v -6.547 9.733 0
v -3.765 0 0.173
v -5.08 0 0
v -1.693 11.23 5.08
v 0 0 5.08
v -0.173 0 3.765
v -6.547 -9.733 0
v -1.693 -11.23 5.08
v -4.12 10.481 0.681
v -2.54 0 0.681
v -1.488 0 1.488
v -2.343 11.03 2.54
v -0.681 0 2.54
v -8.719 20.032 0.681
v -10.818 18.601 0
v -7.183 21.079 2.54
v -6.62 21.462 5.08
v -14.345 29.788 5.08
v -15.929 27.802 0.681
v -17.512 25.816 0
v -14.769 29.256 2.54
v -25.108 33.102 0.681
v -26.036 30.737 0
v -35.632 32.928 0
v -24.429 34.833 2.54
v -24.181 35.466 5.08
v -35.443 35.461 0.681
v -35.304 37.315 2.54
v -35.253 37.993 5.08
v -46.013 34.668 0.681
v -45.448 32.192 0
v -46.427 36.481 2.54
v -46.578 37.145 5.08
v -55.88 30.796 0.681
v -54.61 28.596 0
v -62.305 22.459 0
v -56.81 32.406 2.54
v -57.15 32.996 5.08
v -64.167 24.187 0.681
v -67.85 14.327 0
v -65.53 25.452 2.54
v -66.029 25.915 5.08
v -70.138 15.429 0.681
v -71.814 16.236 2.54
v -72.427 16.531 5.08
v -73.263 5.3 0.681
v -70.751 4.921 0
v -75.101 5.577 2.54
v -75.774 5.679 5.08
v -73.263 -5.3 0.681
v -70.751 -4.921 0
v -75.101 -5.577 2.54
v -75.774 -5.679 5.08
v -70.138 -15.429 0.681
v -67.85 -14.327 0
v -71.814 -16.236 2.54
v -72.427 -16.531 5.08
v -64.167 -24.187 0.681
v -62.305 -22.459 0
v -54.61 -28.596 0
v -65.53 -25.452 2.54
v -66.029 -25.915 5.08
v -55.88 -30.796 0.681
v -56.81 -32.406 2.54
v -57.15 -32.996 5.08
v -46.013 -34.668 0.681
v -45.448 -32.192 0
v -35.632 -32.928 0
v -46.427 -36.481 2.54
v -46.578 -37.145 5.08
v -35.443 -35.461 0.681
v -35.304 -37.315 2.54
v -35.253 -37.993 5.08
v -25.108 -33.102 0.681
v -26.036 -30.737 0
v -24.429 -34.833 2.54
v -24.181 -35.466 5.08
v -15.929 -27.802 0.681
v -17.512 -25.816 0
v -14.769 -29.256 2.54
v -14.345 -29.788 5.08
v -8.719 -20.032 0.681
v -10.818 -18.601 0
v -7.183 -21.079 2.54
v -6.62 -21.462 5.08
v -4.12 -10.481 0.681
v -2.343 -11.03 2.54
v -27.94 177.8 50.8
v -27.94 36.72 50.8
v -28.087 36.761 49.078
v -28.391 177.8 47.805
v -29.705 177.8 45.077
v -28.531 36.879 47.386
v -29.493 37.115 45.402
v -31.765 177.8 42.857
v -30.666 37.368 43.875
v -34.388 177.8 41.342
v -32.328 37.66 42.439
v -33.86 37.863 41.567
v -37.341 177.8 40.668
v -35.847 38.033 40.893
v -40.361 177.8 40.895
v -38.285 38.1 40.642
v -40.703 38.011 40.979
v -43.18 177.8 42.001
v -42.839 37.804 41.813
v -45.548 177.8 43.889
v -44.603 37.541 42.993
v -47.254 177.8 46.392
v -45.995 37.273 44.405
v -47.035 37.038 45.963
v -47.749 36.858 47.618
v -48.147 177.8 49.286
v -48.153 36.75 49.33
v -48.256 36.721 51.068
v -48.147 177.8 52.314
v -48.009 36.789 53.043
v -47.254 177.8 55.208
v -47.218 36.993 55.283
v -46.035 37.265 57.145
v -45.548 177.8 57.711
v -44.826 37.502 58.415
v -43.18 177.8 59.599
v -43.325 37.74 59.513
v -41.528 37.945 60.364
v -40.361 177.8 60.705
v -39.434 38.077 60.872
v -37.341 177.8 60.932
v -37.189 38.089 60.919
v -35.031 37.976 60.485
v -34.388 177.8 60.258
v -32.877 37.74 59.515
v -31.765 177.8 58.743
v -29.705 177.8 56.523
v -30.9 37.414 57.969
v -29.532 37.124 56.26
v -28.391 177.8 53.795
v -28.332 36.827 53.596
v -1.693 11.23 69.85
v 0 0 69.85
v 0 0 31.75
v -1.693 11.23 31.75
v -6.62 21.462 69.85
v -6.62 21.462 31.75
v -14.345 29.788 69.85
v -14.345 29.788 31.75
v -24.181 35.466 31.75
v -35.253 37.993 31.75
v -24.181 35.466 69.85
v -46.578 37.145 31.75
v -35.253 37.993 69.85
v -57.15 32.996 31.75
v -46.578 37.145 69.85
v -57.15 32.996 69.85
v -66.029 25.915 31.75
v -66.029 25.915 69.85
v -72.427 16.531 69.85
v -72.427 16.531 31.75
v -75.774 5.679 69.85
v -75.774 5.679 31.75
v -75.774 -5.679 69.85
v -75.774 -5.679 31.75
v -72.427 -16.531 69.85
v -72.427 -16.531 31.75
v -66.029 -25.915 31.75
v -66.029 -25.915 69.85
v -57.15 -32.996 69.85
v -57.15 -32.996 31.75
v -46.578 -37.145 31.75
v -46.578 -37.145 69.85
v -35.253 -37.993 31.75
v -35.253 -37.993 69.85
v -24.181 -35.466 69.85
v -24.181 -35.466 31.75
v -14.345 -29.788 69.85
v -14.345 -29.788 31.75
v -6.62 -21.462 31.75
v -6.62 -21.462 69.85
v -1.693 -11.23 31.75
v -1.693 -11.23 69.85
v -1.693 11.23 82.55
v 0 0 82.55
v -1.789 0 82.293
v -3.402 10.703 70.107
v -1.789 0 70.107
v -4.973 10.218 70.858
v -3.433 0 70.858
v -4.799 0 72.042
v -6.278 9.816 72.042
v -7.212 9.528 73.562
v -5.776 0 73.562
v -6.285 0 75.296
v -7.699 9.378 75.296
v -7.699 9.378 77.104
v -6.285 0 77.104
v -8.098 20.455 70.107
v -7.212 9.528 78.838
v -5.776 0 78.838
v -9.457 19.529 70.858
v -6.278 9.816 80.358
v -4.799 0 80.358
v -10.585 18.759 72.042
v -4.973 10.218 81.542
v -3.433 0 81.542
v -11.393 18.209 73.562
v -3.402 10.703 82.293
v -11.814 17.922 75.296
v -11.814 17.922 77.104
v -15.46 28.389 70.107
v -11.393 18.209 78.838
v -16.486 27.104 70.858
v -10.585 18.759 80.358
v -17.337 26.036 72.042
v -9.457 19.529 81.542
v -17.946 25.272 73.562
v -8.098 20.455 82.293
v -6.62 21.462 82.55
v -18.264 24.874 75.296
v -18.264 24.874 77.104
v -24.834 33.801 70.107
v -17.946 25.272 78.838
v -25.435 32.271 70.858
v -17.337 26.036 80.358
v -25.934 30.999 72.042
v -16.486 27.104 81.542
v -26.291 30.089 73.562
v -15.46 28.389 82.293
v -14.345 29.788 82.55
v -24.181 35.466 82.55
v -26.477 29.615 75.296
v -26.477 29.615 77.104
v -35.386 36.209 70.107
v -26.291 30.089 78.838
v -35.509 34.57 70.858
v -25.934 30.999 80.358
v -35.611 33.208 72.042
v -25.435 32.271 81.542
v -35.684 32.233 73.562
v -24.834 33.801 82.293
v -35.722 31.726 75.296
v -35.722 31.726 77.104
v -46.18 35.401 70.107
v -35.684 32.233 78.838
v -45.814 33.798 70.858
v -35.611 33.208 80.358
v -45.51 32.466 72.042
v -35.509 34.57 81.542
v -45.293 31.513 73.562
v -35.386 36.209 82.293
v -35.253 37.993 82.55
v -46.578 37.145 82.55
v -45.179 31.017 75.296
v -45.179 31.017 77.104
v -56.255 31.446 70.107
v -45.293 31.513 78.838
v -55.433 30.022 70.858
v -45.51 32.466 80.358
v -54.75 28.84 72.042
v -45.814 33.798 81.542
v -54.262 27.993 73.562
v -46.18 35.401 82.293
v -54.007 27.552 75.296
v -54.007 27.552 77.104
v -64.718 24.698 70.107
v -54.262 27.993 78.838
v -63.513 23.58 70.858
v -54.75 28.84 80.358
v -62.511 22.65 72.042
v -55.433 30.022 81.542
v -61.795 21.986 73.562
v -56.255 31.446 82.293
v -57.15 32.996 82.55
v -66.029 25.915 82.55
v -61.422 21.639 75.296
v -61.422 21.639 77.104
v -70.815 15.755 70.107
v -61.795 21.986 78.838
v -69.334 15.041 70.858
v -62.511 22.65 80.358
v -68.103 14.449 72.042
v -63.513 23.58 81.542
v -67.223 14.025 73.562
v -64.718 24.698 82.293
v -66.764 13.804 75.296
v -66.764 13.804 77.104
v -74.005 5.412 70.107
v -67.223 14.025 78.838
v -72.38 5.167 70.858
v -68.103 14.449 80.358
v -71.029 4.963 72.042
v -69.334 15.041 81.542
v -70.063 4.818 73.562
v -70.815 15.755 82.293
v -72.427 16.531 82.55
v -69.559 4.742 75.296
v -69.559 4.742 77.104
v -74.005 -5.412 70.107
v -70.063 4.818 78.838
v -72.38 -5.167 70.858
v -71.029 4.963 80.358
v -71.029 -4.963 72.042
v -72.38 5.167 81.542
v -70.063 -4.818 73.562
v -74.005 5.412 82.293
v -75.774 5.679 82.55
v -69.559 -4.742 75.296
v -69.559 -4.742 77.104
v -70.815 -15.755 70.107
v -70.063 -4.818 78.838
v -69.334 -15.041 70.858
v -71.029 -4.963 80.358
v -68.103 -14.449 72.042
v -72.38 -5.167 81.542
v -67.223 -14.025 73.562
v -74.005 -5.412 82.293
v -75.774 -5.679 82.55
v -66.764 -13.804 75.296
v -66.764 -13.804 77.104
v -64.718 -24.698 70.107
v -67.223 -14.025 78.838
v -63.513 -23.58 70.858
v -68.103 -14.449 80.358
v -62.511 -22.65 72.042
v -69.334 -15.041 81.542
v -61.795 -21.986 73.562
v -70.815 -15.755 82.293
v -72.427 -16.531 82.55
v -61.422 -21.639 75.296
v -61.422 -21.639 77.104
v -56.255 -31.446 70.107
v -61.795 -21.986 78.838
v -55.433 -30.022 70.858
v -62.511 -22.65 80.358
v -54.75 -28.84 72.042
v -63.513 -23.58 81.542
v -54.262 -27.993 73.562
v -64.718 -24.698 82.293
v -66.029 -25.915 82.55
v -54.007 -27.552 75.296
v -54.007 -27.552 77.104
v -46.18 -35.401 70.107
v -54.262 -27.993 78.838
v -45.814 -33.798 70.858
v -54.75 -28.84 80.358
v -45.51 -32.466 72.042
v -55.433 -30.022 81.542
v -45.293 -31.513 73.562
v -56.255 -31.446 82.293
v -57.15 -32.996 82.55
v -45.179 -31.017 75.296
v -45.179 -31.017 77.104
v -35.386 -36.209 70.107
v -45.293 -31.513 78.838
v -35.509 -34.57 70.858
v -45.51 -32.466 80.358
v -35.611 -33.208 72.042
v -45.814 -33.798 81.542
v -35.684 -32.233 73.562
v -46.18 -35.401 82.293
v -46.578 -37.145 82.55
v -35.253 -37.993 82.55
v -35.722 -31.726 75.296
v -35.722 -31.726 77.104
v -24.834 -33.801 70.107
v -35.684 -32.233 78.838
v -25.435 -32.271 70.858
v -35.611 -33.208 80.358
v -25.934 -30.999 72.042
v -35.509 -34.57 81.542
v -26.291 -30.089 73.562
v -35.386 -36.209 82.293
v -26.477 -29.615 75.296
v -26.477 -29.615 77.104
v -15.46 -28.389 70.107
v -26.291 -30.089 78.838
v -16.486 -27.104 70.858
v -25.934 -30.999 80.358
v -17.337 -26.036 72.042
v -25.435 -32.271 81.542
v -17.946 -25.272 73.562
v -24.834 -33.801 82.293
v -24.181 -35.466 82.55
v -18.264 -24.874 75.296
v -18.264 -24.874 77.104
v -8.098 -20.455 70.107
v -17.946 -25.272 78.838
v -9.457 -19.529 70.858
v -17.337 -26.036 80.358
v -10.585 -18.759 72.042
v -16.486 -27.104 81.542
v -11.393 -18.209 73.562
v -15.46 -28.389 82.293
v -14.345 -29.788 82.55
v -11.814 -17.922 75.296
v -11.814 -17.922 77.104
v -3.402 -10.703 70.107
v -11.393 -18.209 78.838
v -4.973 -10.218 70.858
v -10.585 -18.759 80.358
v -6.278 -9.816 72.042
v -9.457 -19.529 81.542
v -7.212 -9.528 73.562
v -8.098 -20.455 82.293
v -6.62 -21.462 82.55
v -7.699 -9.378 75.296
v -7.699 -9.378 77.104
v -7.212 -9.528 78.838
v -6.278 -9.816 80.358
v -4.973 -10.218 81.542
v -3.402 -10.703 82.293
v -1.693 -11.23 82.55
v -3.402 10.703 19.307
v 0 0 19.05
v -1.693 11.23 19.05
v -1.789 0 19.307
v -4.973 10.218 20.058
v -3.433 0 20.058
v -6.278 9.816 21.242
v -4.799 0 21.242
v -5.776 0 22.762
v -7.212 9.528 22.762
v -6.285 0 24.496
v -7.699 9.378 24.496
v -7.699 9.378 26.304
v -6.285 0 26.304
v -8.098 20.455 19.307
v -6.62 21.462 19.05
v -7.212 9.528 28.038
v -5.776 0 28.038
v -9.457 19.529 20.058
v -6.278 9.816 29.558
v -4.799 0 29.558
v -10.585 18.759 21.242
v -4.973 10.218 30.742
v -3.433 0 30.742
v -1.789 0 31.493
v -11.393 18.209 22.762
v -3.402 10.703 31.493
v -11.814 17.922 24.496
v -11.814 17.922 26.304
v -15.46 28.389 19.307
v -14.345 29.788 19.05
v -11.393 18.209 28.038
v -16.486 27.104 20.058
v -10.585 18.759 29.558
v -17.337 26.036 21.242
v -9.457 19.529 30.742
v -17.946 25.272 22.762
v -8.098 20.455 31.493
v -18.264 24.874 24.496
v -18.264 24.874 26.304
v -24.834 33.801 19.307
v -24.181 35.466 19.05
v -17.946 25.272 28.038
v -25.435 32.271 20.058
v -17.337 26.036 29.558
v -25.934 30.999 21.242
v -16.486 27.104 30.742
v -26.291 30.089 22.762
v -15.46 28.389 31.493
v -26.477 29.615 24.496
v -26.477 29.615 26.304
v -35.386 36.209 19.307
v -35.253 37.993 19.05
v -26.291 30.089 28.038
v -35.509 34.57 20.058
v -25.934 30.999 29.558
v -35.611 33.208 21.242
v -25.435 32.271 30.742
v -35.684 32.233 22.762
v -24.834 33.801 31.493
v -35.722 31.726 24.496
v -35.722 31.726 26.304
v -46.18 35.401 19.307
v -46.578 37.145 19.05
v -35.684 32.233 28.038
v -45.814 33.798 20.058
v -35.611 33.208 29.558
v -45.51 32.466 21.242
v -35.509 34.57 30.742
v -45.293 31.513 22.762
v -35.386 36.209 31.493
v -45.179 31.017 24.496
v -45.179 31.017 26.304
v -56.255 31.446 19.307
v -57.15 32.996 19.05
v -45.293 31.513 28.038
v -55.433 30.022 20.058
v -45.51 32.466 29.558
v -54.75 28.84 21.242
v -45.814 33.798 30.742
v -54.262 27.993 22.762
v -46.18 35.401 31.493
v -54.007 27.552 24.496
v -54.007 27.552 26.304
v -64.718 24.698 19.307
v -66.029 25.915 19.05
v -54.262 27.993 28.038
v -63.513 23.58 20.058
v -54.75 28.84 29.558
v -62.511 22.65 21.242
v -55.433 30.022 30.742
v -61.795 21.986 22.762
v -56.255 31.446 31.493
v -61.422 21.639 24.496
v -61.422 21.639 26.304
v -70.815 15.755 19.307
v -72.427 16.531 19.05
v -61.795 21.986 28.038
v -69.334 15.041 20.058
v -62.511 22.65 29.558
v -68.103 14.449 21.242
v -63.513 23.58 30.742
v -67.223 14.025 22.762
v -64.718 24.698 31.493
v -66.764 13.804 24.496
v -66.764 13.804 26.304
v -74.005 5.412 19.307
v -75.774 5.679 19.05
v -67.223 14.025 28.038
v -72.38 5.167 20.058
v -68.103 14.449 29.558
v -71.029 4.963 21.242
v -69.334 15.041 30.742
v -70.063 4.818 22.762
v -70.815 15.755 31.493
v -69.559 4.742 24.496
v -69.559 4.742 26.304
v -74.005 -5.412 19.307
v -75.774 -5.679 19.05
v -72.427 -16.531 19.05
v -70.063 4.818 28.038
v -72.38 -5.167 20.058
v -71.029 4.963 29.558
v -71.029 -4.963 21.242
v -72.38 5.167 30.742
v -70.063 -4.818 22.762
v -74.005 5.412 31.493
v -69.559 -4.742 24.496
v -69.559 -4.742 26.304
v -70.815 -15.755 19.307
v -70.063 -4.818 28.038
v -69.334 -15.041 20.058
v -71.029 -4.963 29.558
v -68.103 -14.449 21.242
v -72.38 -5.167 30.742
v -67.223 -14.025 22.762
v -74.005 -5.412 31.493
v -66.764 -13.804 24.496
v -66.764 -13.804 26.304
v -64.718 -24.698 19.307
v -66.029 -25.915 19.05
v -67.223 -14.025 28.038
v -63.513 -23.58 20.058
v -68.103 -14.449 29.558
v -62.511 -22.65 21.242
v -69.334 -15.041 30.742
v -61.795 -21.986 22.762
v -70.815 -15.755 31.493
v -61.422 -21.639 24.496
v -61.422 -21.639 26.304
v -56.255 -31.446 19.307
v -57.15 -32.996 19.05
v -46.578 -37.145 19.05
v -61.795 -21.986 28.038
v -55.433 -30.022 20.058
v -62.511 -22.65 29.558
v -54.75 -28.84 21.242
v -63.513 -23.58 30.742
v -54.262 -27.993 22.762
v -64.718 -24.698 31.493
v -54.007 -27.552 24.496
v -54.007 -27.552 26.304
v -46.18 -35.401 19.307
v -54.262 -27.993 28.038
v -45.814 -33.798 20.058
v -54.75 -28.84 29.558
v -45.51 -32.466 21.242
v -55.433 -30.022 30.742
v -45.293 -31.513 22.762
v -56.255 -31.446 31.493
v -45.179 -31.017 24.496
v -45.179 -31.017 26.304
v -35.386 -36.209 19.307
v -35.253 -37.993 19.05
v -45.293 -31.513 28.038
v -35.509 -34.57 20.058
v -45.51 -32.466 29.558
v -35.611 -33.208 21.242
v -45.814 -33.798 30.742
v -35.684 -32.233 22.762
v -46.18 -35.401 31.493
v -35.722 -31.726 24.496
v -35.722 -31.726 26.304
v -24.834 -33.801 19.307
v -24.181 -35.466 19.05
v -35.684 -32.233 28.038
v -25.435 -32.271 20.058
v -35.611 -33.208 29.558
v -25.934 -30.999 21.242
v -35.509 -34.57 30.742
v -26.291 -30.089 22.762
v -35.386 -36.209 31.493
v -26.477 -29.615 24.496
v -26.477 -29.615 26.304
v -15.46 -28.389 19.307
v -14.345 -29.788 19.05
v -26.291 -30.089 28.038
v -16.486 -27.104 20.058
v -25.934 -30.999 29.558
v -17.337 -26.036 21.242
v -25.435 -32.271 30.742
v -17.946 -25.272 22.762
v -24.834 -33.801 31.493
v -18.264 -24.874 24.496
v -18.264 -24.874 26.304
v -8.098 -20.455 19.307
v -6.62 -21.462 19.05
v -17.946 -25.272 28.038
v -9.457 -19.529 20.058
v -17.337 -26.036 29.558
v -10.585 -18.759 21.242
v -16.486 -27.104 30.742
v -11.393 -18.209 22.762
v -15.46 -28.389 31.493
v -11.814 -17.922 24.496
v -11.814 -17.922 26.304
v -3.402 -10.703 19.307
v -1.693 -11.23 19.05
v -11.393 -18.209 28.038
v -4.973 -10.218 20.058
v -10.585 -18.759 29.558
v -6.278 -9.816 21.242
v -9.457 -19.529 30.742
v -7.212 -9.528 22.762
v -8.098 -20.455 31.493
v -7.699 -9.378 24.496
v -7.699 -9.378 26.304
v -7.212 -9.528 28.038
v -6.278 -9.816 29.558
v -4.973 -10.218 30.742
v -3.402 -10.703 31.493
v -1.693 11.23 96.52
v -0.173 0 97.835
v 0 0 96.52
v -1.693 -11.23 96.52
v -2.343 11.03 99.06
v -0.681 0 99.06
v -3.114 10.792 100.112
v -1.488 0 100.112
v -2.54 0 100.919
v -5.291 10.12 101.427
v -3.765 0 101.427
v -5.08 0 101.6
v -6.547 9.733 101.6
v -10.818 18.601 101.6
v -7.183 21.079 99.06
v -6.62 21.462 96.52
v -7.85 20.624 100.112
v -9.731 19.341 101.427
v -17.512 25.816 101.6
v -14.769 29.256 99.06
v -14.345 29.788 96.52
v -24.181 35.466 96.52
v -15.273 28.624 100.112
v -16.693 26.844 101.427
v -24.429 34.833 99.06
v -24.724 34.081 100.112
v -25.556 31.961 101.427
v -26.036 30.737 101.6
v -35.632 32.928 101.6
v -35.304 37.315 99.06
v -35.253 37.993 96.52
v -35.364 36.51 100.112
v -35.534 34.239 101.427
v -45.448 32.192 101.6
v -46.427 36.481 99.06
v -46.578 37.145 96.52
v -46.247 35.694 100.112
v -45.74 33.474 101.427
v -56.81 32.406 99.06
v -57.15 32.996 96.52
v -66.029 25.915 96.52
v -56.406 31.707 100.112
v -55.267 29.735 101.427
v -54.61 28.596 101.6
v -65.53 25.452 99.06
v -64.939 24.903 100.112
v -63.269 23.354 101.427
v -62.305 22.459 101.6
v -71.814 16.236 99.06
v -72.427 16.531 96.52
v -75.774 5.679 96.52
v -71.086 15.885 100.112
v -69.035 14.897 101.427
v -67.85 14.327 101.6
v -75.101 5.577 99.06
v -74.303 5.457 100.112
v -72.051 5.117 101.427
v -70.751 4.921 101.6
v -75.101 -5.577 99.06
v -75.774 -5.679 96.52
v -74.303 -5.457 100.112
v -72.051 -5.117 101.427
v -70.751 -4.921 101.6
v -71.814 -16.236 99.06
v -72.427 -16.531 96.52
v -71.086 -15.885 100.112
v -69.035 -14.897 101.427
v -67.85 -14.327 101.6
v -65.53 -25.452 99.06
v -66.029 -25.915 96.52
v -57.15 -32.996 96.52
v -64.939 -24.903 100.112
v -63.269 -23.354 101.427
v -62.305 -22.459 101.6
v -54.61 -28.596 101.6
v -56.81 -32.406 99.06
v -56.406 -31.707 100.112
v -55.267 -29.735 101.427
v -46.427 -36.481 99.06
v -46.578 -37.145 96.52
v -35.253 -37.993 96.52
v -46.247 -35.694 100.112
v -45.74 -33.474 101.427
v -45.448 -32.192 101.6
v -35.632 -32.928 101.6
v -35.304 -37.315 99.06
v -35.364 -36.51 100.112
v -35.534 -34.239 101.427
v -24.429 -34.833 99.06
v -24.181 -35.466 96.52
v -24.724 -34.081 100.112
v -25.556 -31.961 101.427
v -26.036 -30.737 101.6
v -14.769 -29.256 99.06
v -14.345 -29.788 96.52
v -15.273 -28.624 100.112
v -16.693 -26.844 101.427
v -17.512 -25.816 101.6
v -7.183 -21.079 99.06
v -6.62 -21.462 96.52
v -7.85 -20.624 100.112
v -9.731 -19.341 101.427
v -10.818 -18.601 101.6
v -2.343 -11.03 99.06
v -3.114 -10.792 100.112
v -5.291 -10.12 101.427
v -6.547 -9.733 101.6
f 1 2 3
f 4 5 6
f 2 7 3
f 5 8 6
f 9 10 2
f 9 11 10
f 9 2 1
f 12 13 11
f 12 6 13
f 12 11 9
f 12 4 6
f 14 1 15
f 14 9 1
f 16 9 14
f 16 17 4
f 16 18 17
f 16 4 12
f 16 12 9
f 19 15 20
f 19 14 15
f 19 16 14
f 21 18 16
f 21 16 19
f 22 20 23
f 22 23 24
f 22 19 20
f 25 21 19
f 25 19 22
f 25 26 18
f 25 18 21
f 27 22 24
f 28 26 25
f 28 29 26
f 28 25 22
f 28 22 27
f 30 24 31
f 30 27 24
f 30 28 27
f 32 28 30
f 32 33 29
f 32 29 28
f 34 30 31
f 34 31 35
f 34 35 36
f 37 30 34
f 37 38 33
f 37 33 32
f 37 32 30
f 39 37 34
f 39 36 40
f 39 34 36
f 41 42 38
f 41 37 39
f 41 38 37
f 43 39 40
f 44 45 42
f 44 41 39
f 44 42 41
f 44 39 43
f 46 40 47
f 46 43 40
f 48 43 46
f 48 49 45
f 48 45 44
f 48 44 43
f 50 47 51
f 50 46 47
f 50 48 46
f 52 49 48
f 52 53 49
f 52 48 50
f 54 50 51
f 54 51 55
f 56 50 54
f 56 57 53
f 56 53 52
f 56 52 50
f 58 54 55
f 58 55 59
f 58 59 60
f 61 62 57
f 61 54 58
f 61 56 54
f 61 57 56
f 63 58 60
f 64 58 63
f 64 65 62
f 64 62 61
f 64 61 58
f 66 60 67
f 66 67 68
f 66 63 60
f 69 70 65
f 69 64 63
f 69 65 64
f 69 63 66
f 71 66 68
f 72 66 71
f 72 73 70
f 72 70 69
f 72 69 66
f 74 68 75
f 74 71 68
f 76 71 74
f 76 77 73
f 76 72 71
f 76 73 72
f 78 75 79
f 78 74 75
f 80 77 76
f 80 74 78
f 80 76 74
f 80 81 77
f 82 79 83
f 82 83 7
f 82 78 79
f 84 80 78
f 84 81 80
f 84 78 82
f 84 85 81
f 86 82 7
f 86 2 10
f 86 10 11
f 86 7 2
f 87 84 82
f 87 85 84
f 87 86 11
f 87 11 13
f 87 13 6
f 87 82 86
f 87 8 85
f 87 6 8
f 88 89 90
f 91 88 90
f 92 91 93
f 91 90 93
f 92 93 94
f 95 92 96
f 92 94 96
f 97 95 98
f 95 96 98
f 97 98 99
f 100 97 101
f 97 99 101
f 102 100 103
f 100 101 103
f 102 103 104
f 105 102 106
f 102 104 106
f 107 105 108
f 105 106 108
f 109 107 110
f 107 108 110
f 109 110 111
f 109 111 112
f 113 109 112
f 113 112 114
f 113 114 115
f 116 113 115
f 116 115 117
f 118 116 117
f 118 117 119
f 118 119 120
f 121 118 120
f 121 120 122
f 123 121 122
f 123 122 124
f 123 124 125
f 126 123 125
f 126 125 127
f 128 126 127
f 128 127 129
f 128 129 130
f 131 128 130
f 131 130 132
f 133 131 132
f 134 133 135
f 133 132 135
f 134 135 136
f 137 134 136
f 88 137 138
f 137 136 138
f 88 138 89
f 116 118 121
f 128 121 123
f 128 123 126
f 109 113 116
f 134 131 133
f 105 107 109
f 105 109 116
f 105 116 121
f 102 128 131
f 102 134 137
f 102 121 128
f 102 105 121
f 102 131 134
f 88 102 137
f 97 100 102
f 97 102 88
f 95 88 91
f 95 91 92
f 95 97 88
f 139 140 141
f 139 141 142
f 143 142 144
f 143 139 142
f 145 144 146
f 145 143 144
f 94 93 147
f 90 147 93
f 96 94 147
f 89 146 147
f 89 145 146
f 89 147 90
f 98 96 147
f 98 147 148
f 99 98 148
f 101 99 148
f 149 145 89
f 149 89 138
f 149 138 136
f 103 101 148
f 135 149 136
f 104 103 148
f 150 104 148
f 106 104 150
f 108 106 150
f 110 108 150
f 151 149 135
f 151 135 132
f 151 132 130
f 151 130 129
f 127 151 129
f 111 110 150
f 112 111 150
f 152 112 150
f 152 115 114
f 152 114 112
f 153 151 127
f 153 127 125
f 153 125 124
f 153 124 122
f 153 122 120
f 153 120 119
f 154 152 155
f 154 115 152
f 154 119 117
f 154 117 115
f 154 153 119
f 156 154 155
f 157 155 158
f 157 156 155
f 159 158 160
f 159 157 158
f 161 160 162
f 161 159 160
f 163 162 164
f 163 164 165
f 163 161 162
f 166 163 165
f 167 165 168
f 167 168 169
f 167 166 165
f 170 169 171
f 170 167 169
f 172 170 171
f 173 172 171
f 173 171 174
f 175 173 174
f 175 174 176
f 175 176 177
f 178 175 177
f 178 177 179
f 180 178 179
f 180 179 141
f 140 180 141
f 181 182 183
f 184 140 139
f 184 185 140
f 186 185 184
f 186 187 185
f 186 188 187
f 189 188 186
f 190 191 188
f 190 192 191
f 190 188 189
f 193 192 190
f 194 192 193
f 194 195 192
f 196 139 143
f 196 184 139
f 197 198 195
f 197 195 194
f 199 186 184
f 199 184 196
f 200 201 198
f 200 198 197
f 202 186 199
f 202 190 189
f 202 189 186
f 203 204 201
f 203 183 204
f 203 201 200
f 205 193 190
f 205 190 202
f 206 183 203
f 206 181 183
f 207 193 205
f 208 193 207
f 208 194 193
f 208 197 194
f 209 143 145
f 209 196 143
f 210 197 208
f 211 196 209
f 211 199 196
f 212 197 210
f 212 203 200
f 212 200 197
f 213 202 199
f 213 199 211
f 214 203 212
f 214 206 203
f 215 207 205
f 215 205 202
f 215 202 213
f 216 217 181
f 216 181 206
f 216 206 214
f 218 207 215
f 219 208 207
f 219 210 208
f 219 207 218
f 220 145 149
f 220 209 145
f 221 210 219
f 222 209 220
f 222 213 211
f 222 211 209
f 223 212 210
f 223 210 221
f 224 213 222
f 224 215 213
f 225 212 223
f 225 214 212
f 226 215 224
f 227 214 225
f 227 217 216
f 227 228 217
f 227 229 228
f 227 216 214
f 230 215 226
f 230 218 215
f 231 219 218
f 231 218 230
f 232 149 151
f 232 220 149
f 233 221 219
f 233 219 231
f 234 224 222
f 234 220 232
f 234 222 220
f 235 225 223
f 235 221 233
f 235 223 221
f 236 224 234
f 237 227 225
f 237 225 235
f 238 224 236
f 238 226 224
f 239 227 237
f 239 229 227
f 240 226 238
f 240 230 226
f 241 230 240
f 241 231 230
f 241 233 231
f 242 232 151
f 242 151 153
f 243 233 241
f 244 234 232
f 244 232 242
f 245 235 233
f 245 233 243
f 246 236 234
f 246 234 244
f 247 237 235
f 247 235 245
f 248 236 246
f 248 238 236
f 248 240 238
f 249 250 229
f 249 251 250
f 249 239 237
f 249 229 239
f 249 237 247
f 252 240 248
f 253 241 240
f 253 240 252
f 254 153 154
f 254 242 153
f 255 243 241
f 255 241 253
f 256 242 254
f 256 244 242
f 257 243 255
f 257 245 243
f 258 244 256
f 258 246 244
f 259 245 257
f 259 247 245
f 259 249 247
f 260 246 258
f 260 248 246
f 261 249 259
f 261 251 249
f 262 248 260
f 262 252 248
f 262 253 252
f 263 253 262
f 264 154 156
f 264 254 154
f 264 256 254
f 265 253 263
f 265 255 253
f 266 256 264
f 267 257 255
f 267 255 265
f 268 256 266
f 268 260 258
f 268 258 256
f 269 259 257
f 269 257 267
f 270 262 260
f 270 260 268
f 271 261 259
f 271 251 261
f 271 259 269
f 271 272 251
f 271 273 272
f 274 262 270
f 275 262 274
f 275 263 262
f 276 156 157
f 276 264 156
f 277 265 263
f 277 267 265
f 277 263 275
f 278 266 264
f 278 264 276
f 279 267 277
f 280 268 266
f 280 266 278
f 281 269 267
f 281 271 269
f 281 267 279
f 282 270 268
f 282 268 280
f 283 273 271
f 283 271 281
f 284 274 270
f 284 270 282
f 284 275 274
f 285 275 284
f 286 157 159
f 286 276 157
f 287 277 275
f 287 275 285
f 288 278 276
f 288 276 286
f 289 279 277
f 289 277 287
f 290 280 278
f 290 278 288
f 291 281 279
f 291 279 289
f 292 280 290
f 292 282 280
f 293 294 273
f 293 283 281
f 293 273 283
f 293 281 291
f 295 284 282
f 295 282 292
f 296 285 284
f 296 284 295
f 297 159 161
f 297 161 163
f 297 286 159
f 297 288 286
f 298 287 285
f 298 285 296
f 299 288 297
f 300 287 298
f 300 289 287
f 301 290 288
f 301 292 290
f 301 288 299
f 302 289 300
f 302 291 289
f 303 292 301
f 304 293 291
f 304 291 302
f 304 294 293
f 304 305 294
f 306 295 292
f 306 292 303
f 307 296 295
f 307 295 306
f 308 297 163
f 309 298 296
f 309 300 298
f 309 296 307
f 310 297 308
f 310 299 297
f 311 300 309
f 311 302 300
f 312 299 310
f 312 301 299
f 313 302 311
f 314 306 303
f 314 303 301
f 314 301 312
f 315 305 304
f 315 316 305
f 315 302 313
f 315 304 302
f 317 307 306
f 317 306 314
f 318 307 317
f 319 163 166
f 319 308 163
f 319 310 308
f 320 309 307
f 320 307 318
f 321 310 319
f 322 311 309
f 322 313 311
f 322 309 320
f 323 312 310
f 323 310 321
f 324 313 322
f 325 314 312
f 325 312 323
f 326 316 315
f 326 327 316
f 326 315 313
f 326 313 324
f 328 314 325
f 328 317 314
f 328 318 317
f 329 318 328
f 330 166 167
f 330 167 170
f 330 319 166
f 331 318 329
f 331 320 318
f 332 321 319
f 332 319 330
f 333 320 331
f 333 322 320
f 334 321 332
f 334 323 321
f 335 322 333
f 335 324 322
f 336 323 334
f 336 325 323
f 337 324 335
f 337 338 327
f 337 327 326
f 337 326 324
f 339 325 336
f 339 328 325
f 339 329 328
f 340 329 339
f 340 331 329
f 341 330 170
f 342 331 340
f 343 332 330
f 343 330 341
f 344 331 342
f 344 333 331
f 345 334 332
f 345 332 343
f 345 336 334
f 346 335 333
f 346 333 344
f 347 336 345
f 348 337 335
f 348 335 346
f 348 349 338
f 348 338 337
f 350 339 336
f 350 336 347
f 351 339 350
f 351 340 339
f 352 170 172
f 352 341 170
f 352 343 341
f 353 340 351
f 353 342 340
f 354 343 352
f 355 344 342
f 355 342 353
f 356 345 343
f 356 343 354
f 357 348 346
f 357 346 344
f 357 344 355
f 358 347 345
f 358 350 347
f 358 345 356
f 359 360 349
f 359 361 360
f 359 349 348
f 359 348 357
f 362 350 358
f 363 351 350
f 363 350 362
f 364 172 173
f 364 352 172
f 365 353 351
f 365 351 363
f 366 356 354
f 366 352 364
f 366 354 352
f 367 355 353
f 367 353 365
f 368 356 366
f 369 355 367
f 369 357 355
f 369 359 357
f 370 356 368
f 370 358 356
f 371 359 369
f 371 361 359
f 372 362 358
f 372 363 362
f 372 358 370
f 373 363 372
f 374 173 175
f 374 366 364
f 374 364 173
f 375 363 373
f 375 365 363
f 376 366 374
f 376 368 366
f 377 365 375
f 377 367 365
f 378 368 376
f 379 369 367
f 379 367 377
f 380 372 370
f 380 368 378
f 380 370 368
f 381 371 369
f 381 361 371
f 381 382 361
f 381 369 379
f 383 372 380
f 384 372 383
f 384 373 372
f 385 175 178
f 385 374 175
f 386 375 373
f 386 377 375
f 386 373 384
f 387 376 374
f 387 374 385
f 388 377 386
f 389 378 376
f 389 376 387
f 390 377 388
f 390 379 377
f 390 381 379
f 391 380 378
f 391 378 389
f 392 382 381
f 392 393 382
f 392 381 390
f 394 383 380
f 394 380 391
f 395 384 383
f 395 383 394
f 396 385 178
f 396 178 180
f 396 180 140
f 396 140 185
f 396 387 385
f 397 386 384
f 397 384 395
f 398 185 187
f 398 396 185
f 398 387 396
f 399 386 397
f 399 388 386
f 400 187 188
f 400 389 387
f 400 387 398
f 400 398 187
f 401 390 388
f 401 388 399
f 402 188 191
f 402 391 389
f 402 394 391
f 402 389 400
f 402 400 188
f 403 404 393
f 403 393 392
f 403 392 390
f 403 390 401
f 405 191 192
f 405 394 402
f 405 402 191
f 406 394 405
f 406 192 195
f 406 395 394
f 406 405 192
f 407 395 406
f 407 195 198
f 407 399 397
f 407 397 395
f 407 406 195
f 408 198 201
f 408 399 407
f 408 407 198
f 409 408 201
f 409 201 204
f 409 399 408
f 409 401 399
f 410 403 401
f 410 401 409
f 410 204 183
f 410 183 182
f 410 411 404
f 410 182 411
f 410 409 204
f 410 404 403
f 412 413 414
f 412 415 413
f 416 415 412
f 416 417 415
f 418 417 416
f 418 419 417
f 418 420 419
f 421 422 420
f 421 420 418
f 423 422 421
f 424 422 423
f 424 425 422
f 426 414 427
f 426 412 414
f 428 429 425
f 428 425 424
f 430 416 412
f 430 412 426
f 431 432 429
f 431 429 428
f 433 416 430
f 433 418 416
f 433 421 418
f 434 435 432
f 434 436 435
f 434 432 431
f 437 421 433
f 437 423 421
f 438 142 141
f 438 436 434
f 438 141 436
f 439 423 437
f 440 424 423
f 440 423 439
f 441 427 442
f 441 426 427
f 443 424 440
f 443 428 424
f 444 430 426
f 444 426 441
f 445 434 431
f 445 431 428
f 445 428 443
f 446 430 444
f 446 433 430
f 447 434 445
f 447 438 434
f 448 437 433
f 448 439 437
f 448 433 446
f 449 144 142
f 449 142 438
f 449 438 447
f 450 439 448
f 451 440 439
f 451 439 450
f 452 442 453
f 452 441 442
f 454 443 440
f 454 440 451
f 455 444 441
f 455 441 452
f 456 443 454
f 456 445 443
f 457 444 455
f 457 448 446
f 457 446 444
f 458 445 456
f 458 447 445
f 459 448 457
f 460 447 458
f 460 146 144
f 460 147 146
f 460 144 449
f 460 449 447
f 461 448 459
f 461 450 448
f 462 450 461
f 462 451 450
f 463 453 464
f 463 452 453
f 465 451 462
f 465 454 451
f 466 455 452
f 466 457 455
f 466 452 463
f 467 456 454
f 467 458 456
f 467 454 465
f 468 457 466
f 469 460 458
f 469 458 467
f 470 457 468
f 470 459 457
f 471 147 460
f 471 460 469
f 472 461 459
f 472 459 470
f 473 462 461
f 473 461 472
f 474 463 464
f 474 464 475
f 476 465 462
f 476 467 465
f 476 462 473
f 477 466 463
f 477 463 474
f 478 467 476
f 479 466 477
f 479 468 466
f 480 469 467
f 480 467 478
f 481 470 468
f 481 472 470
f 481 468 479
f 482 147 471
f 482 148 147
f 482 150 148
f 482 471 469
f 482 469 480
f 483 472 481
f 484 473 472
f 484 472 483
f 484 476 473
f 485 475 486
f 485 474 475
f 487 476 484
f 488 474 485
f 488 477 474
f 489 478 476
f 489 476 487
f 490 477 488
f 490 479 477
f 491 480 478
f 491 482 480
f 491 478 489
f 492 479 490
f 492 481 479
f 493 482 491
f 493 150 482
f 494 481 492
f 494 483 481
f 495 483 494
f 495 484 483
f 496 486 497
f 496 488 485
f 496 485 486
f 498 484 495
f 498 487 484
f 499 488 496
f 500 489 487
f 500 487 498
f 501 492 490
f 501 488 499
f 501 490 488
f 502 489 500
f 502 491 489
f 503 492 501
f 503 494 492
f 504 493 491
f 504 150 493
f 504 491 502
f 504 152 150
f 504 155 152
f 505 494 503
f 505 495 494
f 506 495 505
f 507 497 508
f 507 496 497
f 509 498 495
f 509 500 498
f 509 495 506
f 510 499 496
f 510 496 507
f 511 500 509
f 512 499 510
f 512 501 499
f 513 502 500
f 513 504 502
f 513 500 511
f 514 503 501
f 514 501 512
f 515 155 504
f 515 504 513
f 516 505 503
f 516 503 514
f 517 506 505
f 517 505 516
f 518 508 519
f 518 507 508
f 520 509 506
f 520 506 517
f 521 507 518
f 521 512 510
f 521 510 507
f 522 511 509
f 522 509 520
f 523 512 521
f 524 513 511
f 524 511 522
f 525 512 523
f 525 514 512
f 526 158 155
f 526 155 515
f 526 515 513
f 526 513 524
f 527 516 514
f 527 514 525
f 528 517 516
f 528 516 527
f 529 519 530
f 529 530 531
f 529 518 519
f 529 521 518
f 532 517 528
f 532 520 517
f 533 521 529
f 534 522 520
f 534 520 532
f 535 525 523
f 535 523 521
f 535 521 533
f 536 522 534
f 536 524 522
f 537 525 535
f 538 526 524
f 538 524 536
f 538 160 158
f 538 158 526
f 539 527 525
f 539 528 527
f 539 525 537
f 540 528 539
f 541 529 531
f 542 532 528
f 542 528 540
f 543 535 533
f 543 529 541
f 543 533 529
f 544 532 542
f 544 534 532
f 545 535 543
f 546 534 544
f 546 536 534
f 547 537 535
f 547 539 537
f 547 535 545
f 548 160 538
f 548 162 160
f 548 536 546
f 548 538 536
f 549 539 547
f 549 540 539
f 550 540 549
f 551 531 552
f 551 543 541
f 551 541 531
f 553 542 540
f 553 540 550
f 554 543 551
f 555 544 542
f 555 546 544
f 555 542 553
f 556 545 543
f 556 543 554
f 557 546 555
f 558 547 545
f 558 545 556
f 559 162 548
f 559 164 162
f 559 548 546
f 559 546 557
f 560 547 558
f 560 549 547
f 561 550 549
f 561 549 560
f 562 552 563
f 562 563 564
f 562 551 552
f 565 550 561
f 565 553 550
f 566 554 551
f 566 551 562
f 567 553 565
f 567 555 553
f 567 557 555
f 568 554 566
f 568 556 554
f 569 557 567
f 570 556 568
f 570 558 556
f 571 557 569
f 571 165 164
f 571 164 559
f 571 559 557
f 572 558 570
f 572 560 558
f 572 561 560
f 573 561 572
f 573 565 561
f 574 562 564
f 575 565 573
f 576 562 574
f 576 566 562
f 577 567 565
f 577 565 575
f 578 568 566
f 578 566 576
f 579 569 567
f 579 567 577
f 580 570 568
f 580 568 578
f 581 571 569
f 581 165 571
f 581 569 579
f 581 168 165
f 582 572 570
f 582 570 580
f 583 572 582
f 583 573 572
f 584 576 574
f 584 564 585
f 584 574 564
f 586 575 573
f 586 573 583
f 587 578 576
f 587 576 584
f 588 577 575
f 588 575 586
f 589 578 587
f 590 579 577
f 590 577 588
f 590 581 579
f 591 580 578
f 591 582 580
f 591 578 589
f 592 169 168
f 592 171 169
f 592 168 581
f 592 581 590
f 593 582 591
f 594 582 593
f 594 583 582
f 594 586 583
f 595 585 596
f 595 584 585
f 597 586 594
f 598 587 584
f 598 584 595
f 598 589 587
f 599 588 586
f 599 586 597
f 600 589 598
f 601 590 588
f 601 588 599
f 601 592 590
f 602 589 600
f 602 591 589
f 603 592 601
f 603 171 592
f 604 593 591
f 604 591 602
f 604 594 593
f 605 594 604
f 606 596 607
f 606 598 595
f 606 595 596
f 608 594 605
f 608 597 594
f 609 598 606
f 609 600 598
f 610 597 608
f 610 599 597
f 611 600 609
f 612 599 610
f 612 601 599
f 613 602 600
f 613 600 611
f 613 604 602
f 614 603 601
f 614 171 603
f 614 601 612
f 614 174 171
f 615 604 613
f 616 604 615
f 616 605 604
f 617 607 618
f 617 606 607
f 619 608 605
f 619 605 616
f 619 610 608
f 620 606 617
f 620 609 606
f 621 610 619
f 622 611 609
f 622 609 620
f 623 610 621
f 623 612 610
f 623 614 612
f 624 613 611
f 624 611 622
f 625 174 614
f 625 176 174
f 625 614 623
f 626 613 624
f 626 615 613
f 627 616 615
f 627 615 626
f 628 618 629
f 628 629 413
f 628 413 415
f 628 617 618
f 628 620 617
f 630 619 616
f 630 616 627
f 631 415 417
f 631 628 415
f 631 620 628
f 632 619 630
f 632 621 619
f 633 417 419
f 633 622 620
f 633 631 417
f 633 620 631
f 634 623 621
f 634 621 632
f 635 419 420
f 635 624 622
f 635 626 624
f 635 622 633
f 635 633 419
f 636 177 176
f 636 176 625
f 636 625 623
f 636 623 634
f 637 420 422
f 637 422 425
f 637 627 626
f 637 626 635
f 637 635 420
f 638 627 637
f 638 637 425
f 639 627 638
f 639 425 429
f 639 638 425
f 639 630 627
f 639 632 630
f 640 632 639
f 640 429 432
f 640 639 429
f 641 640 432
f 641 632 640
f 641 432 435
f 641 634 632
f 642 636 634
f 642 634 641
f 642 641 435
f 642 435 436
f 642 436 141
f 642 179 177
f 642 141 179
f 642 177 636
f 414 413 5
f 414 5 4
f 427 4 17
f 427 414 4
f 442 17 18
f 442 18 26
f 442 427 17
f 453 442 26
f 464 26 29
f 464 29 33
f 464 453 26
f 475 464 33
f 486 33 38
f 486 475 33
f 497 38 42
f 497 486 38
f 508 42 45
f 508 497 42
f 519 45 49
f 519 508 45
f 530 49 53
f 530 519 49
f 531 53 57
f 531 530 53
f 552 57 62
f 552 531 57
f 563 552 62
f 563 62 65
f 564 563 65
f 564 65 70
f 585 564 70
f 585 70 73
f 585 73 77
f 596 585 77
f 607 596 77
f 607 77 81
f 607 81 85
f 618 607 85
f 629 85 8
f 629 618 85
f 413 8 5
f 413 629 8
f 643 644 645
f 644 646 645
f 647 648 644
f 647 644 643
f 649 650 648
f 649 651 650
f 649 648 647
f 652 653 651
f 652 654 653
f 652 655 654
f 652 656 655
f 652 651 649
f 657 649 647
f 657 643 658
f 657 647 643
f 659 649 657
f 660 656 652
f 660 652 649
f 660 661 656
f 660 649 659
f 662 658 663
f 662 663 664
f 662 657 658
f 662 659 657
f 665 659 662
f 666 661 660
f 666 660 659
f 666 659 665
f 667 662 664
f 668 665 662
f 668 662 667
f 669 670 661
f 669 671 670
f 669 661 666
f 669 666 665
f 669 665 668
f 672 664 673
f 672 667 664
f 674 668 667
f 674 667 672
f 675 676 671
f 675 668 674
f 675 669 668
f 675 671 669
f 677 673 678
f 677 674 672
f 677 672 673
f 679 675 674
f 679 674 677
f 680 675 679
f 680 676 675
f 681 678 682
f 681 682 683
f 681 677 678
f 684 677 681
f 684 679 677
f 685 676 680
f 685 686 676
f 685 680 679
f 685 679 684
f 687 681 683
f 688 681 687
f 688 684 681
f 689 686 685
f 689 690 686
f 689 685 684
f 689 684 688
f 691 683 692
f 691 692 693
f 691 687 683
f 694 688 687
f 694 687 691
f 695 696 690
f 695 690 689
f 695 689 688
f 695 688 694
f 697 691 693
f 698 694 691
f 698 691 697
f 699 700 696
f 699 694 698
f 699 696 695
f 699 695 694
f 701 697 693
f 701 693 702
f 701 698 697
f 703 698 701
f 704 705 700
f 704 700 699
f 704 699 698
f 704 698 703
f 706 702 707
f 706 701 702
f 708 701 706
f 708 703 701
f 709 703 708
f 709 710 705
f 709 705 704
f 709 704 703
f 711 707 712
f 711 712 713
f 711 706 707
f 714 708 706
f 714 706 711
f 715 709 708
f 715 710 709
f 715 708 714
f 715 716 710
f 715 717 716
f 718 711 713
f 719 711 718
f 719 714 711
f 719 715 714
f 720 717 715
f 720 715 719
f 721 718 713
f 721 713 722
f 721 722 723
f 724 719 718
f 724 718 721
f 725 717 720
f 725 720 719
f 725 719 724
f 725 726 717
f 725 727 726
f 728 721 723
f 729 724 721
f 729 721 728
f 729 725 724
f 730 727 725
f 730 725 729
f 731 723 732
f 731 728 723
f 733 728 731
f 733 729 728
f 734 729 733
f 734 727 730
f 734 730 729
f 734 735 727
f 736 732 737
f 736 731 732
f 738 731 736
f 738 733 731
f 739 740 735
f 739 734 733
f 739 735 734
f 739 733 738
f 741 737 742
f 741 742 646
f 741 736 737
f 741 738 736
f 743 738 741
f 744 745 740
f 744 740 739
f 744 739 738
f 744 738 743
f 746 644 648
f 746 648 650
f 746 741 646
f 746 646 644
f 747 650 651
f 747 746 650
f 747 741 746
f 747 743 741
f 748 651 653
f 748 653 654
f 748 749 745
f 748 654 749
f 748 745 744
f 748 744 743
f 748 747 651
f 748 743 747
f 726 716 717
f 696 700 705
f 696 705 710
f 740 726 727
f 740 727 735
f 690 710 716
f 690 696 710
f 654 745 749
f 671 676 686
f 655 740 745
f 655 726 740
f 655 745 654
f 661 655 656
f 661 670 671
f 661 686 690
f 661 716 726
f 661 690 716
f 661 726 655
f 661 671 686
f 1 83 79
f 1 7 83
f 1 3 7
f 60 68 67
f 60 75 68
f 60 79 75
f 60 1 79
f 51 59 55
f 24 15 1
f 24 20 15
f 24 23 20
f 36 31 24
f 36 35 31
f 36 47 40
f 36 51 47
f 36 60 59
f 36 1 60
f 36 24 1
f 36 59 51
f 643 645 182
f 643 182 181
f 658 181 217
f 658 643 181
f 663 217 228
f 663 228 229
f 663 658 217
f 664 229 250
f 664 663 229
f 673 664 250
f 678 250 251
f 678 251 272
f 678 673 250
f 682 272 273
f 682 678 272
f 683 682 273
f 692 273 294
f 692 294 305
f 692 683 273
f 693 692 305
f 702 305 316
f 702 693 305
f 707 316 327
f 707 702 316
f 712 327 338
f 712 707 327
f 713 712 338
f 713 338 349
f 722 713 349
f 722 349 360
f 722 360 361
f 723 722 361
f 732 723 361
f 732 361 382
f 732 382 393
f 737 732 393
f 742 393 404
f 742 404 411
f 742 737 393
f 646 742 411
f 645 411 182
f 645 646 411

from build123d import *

# Parameters (mm, degrees)
F2_R      = 5.08
F3_R      = 10.16
F4_DEPTH  = 152.4
F4_FACE_R = 10.16
F5_DEPTH  = 177.8


with BuildPart() as f1:
    # F0 (on Front) → F1 (revolve)
    with BuildSketch(Plane.XZ):
        with BuildLine():
            Line((-38.1, 0), (0, 0))
            Line((0, 0), (0, 19.05))
            ThreePointArc((0, 19.05), (-6.35, 25.4), (0, 31.75))
            Line((0, 31.75), (0, 69.85))
            ThreePointArc((0, 69.85), (-6.35, 76.2), (0, 82.55))
            Line((0, 82.55), (0, 101.6))
            Line((0, 101.6), (-38.1, 101.6))
            Line((-38.1, 101.6), (-38.1, 0))
        make_face()
    revolve(axis=Axis((-38.1, 0, 50.8), (0, 0, 1)))

    # F2
    f2_edges = [f1.edges().sort_by_distance(p)[0] for p in [
        (-76.2, 0, 101.6),
        (-76.2, 0, 0),
    ]]
    fillet(f2_edges, radius=F2_R)

    # F3 (on Front) → F4 (cut)
    with BuildSketch(Plane.XZ):
        with Locations((-38.1, 50.8)):
            Circle(F3_R)
    extrude(amount=-F4_DEPTH, mode=Mode.SUBTRACT)

    # F4_face (on face) → F5 (join)
    with BuildSketch(Plane(origin=(-38.1, 0, 50.8), x_dir=(1, 0, 0), z_dir=(0, 1, 0))):
        Circle(F4_FACE_R)
    extrude(amount=F5_DEPTH)


solid = f1.part
